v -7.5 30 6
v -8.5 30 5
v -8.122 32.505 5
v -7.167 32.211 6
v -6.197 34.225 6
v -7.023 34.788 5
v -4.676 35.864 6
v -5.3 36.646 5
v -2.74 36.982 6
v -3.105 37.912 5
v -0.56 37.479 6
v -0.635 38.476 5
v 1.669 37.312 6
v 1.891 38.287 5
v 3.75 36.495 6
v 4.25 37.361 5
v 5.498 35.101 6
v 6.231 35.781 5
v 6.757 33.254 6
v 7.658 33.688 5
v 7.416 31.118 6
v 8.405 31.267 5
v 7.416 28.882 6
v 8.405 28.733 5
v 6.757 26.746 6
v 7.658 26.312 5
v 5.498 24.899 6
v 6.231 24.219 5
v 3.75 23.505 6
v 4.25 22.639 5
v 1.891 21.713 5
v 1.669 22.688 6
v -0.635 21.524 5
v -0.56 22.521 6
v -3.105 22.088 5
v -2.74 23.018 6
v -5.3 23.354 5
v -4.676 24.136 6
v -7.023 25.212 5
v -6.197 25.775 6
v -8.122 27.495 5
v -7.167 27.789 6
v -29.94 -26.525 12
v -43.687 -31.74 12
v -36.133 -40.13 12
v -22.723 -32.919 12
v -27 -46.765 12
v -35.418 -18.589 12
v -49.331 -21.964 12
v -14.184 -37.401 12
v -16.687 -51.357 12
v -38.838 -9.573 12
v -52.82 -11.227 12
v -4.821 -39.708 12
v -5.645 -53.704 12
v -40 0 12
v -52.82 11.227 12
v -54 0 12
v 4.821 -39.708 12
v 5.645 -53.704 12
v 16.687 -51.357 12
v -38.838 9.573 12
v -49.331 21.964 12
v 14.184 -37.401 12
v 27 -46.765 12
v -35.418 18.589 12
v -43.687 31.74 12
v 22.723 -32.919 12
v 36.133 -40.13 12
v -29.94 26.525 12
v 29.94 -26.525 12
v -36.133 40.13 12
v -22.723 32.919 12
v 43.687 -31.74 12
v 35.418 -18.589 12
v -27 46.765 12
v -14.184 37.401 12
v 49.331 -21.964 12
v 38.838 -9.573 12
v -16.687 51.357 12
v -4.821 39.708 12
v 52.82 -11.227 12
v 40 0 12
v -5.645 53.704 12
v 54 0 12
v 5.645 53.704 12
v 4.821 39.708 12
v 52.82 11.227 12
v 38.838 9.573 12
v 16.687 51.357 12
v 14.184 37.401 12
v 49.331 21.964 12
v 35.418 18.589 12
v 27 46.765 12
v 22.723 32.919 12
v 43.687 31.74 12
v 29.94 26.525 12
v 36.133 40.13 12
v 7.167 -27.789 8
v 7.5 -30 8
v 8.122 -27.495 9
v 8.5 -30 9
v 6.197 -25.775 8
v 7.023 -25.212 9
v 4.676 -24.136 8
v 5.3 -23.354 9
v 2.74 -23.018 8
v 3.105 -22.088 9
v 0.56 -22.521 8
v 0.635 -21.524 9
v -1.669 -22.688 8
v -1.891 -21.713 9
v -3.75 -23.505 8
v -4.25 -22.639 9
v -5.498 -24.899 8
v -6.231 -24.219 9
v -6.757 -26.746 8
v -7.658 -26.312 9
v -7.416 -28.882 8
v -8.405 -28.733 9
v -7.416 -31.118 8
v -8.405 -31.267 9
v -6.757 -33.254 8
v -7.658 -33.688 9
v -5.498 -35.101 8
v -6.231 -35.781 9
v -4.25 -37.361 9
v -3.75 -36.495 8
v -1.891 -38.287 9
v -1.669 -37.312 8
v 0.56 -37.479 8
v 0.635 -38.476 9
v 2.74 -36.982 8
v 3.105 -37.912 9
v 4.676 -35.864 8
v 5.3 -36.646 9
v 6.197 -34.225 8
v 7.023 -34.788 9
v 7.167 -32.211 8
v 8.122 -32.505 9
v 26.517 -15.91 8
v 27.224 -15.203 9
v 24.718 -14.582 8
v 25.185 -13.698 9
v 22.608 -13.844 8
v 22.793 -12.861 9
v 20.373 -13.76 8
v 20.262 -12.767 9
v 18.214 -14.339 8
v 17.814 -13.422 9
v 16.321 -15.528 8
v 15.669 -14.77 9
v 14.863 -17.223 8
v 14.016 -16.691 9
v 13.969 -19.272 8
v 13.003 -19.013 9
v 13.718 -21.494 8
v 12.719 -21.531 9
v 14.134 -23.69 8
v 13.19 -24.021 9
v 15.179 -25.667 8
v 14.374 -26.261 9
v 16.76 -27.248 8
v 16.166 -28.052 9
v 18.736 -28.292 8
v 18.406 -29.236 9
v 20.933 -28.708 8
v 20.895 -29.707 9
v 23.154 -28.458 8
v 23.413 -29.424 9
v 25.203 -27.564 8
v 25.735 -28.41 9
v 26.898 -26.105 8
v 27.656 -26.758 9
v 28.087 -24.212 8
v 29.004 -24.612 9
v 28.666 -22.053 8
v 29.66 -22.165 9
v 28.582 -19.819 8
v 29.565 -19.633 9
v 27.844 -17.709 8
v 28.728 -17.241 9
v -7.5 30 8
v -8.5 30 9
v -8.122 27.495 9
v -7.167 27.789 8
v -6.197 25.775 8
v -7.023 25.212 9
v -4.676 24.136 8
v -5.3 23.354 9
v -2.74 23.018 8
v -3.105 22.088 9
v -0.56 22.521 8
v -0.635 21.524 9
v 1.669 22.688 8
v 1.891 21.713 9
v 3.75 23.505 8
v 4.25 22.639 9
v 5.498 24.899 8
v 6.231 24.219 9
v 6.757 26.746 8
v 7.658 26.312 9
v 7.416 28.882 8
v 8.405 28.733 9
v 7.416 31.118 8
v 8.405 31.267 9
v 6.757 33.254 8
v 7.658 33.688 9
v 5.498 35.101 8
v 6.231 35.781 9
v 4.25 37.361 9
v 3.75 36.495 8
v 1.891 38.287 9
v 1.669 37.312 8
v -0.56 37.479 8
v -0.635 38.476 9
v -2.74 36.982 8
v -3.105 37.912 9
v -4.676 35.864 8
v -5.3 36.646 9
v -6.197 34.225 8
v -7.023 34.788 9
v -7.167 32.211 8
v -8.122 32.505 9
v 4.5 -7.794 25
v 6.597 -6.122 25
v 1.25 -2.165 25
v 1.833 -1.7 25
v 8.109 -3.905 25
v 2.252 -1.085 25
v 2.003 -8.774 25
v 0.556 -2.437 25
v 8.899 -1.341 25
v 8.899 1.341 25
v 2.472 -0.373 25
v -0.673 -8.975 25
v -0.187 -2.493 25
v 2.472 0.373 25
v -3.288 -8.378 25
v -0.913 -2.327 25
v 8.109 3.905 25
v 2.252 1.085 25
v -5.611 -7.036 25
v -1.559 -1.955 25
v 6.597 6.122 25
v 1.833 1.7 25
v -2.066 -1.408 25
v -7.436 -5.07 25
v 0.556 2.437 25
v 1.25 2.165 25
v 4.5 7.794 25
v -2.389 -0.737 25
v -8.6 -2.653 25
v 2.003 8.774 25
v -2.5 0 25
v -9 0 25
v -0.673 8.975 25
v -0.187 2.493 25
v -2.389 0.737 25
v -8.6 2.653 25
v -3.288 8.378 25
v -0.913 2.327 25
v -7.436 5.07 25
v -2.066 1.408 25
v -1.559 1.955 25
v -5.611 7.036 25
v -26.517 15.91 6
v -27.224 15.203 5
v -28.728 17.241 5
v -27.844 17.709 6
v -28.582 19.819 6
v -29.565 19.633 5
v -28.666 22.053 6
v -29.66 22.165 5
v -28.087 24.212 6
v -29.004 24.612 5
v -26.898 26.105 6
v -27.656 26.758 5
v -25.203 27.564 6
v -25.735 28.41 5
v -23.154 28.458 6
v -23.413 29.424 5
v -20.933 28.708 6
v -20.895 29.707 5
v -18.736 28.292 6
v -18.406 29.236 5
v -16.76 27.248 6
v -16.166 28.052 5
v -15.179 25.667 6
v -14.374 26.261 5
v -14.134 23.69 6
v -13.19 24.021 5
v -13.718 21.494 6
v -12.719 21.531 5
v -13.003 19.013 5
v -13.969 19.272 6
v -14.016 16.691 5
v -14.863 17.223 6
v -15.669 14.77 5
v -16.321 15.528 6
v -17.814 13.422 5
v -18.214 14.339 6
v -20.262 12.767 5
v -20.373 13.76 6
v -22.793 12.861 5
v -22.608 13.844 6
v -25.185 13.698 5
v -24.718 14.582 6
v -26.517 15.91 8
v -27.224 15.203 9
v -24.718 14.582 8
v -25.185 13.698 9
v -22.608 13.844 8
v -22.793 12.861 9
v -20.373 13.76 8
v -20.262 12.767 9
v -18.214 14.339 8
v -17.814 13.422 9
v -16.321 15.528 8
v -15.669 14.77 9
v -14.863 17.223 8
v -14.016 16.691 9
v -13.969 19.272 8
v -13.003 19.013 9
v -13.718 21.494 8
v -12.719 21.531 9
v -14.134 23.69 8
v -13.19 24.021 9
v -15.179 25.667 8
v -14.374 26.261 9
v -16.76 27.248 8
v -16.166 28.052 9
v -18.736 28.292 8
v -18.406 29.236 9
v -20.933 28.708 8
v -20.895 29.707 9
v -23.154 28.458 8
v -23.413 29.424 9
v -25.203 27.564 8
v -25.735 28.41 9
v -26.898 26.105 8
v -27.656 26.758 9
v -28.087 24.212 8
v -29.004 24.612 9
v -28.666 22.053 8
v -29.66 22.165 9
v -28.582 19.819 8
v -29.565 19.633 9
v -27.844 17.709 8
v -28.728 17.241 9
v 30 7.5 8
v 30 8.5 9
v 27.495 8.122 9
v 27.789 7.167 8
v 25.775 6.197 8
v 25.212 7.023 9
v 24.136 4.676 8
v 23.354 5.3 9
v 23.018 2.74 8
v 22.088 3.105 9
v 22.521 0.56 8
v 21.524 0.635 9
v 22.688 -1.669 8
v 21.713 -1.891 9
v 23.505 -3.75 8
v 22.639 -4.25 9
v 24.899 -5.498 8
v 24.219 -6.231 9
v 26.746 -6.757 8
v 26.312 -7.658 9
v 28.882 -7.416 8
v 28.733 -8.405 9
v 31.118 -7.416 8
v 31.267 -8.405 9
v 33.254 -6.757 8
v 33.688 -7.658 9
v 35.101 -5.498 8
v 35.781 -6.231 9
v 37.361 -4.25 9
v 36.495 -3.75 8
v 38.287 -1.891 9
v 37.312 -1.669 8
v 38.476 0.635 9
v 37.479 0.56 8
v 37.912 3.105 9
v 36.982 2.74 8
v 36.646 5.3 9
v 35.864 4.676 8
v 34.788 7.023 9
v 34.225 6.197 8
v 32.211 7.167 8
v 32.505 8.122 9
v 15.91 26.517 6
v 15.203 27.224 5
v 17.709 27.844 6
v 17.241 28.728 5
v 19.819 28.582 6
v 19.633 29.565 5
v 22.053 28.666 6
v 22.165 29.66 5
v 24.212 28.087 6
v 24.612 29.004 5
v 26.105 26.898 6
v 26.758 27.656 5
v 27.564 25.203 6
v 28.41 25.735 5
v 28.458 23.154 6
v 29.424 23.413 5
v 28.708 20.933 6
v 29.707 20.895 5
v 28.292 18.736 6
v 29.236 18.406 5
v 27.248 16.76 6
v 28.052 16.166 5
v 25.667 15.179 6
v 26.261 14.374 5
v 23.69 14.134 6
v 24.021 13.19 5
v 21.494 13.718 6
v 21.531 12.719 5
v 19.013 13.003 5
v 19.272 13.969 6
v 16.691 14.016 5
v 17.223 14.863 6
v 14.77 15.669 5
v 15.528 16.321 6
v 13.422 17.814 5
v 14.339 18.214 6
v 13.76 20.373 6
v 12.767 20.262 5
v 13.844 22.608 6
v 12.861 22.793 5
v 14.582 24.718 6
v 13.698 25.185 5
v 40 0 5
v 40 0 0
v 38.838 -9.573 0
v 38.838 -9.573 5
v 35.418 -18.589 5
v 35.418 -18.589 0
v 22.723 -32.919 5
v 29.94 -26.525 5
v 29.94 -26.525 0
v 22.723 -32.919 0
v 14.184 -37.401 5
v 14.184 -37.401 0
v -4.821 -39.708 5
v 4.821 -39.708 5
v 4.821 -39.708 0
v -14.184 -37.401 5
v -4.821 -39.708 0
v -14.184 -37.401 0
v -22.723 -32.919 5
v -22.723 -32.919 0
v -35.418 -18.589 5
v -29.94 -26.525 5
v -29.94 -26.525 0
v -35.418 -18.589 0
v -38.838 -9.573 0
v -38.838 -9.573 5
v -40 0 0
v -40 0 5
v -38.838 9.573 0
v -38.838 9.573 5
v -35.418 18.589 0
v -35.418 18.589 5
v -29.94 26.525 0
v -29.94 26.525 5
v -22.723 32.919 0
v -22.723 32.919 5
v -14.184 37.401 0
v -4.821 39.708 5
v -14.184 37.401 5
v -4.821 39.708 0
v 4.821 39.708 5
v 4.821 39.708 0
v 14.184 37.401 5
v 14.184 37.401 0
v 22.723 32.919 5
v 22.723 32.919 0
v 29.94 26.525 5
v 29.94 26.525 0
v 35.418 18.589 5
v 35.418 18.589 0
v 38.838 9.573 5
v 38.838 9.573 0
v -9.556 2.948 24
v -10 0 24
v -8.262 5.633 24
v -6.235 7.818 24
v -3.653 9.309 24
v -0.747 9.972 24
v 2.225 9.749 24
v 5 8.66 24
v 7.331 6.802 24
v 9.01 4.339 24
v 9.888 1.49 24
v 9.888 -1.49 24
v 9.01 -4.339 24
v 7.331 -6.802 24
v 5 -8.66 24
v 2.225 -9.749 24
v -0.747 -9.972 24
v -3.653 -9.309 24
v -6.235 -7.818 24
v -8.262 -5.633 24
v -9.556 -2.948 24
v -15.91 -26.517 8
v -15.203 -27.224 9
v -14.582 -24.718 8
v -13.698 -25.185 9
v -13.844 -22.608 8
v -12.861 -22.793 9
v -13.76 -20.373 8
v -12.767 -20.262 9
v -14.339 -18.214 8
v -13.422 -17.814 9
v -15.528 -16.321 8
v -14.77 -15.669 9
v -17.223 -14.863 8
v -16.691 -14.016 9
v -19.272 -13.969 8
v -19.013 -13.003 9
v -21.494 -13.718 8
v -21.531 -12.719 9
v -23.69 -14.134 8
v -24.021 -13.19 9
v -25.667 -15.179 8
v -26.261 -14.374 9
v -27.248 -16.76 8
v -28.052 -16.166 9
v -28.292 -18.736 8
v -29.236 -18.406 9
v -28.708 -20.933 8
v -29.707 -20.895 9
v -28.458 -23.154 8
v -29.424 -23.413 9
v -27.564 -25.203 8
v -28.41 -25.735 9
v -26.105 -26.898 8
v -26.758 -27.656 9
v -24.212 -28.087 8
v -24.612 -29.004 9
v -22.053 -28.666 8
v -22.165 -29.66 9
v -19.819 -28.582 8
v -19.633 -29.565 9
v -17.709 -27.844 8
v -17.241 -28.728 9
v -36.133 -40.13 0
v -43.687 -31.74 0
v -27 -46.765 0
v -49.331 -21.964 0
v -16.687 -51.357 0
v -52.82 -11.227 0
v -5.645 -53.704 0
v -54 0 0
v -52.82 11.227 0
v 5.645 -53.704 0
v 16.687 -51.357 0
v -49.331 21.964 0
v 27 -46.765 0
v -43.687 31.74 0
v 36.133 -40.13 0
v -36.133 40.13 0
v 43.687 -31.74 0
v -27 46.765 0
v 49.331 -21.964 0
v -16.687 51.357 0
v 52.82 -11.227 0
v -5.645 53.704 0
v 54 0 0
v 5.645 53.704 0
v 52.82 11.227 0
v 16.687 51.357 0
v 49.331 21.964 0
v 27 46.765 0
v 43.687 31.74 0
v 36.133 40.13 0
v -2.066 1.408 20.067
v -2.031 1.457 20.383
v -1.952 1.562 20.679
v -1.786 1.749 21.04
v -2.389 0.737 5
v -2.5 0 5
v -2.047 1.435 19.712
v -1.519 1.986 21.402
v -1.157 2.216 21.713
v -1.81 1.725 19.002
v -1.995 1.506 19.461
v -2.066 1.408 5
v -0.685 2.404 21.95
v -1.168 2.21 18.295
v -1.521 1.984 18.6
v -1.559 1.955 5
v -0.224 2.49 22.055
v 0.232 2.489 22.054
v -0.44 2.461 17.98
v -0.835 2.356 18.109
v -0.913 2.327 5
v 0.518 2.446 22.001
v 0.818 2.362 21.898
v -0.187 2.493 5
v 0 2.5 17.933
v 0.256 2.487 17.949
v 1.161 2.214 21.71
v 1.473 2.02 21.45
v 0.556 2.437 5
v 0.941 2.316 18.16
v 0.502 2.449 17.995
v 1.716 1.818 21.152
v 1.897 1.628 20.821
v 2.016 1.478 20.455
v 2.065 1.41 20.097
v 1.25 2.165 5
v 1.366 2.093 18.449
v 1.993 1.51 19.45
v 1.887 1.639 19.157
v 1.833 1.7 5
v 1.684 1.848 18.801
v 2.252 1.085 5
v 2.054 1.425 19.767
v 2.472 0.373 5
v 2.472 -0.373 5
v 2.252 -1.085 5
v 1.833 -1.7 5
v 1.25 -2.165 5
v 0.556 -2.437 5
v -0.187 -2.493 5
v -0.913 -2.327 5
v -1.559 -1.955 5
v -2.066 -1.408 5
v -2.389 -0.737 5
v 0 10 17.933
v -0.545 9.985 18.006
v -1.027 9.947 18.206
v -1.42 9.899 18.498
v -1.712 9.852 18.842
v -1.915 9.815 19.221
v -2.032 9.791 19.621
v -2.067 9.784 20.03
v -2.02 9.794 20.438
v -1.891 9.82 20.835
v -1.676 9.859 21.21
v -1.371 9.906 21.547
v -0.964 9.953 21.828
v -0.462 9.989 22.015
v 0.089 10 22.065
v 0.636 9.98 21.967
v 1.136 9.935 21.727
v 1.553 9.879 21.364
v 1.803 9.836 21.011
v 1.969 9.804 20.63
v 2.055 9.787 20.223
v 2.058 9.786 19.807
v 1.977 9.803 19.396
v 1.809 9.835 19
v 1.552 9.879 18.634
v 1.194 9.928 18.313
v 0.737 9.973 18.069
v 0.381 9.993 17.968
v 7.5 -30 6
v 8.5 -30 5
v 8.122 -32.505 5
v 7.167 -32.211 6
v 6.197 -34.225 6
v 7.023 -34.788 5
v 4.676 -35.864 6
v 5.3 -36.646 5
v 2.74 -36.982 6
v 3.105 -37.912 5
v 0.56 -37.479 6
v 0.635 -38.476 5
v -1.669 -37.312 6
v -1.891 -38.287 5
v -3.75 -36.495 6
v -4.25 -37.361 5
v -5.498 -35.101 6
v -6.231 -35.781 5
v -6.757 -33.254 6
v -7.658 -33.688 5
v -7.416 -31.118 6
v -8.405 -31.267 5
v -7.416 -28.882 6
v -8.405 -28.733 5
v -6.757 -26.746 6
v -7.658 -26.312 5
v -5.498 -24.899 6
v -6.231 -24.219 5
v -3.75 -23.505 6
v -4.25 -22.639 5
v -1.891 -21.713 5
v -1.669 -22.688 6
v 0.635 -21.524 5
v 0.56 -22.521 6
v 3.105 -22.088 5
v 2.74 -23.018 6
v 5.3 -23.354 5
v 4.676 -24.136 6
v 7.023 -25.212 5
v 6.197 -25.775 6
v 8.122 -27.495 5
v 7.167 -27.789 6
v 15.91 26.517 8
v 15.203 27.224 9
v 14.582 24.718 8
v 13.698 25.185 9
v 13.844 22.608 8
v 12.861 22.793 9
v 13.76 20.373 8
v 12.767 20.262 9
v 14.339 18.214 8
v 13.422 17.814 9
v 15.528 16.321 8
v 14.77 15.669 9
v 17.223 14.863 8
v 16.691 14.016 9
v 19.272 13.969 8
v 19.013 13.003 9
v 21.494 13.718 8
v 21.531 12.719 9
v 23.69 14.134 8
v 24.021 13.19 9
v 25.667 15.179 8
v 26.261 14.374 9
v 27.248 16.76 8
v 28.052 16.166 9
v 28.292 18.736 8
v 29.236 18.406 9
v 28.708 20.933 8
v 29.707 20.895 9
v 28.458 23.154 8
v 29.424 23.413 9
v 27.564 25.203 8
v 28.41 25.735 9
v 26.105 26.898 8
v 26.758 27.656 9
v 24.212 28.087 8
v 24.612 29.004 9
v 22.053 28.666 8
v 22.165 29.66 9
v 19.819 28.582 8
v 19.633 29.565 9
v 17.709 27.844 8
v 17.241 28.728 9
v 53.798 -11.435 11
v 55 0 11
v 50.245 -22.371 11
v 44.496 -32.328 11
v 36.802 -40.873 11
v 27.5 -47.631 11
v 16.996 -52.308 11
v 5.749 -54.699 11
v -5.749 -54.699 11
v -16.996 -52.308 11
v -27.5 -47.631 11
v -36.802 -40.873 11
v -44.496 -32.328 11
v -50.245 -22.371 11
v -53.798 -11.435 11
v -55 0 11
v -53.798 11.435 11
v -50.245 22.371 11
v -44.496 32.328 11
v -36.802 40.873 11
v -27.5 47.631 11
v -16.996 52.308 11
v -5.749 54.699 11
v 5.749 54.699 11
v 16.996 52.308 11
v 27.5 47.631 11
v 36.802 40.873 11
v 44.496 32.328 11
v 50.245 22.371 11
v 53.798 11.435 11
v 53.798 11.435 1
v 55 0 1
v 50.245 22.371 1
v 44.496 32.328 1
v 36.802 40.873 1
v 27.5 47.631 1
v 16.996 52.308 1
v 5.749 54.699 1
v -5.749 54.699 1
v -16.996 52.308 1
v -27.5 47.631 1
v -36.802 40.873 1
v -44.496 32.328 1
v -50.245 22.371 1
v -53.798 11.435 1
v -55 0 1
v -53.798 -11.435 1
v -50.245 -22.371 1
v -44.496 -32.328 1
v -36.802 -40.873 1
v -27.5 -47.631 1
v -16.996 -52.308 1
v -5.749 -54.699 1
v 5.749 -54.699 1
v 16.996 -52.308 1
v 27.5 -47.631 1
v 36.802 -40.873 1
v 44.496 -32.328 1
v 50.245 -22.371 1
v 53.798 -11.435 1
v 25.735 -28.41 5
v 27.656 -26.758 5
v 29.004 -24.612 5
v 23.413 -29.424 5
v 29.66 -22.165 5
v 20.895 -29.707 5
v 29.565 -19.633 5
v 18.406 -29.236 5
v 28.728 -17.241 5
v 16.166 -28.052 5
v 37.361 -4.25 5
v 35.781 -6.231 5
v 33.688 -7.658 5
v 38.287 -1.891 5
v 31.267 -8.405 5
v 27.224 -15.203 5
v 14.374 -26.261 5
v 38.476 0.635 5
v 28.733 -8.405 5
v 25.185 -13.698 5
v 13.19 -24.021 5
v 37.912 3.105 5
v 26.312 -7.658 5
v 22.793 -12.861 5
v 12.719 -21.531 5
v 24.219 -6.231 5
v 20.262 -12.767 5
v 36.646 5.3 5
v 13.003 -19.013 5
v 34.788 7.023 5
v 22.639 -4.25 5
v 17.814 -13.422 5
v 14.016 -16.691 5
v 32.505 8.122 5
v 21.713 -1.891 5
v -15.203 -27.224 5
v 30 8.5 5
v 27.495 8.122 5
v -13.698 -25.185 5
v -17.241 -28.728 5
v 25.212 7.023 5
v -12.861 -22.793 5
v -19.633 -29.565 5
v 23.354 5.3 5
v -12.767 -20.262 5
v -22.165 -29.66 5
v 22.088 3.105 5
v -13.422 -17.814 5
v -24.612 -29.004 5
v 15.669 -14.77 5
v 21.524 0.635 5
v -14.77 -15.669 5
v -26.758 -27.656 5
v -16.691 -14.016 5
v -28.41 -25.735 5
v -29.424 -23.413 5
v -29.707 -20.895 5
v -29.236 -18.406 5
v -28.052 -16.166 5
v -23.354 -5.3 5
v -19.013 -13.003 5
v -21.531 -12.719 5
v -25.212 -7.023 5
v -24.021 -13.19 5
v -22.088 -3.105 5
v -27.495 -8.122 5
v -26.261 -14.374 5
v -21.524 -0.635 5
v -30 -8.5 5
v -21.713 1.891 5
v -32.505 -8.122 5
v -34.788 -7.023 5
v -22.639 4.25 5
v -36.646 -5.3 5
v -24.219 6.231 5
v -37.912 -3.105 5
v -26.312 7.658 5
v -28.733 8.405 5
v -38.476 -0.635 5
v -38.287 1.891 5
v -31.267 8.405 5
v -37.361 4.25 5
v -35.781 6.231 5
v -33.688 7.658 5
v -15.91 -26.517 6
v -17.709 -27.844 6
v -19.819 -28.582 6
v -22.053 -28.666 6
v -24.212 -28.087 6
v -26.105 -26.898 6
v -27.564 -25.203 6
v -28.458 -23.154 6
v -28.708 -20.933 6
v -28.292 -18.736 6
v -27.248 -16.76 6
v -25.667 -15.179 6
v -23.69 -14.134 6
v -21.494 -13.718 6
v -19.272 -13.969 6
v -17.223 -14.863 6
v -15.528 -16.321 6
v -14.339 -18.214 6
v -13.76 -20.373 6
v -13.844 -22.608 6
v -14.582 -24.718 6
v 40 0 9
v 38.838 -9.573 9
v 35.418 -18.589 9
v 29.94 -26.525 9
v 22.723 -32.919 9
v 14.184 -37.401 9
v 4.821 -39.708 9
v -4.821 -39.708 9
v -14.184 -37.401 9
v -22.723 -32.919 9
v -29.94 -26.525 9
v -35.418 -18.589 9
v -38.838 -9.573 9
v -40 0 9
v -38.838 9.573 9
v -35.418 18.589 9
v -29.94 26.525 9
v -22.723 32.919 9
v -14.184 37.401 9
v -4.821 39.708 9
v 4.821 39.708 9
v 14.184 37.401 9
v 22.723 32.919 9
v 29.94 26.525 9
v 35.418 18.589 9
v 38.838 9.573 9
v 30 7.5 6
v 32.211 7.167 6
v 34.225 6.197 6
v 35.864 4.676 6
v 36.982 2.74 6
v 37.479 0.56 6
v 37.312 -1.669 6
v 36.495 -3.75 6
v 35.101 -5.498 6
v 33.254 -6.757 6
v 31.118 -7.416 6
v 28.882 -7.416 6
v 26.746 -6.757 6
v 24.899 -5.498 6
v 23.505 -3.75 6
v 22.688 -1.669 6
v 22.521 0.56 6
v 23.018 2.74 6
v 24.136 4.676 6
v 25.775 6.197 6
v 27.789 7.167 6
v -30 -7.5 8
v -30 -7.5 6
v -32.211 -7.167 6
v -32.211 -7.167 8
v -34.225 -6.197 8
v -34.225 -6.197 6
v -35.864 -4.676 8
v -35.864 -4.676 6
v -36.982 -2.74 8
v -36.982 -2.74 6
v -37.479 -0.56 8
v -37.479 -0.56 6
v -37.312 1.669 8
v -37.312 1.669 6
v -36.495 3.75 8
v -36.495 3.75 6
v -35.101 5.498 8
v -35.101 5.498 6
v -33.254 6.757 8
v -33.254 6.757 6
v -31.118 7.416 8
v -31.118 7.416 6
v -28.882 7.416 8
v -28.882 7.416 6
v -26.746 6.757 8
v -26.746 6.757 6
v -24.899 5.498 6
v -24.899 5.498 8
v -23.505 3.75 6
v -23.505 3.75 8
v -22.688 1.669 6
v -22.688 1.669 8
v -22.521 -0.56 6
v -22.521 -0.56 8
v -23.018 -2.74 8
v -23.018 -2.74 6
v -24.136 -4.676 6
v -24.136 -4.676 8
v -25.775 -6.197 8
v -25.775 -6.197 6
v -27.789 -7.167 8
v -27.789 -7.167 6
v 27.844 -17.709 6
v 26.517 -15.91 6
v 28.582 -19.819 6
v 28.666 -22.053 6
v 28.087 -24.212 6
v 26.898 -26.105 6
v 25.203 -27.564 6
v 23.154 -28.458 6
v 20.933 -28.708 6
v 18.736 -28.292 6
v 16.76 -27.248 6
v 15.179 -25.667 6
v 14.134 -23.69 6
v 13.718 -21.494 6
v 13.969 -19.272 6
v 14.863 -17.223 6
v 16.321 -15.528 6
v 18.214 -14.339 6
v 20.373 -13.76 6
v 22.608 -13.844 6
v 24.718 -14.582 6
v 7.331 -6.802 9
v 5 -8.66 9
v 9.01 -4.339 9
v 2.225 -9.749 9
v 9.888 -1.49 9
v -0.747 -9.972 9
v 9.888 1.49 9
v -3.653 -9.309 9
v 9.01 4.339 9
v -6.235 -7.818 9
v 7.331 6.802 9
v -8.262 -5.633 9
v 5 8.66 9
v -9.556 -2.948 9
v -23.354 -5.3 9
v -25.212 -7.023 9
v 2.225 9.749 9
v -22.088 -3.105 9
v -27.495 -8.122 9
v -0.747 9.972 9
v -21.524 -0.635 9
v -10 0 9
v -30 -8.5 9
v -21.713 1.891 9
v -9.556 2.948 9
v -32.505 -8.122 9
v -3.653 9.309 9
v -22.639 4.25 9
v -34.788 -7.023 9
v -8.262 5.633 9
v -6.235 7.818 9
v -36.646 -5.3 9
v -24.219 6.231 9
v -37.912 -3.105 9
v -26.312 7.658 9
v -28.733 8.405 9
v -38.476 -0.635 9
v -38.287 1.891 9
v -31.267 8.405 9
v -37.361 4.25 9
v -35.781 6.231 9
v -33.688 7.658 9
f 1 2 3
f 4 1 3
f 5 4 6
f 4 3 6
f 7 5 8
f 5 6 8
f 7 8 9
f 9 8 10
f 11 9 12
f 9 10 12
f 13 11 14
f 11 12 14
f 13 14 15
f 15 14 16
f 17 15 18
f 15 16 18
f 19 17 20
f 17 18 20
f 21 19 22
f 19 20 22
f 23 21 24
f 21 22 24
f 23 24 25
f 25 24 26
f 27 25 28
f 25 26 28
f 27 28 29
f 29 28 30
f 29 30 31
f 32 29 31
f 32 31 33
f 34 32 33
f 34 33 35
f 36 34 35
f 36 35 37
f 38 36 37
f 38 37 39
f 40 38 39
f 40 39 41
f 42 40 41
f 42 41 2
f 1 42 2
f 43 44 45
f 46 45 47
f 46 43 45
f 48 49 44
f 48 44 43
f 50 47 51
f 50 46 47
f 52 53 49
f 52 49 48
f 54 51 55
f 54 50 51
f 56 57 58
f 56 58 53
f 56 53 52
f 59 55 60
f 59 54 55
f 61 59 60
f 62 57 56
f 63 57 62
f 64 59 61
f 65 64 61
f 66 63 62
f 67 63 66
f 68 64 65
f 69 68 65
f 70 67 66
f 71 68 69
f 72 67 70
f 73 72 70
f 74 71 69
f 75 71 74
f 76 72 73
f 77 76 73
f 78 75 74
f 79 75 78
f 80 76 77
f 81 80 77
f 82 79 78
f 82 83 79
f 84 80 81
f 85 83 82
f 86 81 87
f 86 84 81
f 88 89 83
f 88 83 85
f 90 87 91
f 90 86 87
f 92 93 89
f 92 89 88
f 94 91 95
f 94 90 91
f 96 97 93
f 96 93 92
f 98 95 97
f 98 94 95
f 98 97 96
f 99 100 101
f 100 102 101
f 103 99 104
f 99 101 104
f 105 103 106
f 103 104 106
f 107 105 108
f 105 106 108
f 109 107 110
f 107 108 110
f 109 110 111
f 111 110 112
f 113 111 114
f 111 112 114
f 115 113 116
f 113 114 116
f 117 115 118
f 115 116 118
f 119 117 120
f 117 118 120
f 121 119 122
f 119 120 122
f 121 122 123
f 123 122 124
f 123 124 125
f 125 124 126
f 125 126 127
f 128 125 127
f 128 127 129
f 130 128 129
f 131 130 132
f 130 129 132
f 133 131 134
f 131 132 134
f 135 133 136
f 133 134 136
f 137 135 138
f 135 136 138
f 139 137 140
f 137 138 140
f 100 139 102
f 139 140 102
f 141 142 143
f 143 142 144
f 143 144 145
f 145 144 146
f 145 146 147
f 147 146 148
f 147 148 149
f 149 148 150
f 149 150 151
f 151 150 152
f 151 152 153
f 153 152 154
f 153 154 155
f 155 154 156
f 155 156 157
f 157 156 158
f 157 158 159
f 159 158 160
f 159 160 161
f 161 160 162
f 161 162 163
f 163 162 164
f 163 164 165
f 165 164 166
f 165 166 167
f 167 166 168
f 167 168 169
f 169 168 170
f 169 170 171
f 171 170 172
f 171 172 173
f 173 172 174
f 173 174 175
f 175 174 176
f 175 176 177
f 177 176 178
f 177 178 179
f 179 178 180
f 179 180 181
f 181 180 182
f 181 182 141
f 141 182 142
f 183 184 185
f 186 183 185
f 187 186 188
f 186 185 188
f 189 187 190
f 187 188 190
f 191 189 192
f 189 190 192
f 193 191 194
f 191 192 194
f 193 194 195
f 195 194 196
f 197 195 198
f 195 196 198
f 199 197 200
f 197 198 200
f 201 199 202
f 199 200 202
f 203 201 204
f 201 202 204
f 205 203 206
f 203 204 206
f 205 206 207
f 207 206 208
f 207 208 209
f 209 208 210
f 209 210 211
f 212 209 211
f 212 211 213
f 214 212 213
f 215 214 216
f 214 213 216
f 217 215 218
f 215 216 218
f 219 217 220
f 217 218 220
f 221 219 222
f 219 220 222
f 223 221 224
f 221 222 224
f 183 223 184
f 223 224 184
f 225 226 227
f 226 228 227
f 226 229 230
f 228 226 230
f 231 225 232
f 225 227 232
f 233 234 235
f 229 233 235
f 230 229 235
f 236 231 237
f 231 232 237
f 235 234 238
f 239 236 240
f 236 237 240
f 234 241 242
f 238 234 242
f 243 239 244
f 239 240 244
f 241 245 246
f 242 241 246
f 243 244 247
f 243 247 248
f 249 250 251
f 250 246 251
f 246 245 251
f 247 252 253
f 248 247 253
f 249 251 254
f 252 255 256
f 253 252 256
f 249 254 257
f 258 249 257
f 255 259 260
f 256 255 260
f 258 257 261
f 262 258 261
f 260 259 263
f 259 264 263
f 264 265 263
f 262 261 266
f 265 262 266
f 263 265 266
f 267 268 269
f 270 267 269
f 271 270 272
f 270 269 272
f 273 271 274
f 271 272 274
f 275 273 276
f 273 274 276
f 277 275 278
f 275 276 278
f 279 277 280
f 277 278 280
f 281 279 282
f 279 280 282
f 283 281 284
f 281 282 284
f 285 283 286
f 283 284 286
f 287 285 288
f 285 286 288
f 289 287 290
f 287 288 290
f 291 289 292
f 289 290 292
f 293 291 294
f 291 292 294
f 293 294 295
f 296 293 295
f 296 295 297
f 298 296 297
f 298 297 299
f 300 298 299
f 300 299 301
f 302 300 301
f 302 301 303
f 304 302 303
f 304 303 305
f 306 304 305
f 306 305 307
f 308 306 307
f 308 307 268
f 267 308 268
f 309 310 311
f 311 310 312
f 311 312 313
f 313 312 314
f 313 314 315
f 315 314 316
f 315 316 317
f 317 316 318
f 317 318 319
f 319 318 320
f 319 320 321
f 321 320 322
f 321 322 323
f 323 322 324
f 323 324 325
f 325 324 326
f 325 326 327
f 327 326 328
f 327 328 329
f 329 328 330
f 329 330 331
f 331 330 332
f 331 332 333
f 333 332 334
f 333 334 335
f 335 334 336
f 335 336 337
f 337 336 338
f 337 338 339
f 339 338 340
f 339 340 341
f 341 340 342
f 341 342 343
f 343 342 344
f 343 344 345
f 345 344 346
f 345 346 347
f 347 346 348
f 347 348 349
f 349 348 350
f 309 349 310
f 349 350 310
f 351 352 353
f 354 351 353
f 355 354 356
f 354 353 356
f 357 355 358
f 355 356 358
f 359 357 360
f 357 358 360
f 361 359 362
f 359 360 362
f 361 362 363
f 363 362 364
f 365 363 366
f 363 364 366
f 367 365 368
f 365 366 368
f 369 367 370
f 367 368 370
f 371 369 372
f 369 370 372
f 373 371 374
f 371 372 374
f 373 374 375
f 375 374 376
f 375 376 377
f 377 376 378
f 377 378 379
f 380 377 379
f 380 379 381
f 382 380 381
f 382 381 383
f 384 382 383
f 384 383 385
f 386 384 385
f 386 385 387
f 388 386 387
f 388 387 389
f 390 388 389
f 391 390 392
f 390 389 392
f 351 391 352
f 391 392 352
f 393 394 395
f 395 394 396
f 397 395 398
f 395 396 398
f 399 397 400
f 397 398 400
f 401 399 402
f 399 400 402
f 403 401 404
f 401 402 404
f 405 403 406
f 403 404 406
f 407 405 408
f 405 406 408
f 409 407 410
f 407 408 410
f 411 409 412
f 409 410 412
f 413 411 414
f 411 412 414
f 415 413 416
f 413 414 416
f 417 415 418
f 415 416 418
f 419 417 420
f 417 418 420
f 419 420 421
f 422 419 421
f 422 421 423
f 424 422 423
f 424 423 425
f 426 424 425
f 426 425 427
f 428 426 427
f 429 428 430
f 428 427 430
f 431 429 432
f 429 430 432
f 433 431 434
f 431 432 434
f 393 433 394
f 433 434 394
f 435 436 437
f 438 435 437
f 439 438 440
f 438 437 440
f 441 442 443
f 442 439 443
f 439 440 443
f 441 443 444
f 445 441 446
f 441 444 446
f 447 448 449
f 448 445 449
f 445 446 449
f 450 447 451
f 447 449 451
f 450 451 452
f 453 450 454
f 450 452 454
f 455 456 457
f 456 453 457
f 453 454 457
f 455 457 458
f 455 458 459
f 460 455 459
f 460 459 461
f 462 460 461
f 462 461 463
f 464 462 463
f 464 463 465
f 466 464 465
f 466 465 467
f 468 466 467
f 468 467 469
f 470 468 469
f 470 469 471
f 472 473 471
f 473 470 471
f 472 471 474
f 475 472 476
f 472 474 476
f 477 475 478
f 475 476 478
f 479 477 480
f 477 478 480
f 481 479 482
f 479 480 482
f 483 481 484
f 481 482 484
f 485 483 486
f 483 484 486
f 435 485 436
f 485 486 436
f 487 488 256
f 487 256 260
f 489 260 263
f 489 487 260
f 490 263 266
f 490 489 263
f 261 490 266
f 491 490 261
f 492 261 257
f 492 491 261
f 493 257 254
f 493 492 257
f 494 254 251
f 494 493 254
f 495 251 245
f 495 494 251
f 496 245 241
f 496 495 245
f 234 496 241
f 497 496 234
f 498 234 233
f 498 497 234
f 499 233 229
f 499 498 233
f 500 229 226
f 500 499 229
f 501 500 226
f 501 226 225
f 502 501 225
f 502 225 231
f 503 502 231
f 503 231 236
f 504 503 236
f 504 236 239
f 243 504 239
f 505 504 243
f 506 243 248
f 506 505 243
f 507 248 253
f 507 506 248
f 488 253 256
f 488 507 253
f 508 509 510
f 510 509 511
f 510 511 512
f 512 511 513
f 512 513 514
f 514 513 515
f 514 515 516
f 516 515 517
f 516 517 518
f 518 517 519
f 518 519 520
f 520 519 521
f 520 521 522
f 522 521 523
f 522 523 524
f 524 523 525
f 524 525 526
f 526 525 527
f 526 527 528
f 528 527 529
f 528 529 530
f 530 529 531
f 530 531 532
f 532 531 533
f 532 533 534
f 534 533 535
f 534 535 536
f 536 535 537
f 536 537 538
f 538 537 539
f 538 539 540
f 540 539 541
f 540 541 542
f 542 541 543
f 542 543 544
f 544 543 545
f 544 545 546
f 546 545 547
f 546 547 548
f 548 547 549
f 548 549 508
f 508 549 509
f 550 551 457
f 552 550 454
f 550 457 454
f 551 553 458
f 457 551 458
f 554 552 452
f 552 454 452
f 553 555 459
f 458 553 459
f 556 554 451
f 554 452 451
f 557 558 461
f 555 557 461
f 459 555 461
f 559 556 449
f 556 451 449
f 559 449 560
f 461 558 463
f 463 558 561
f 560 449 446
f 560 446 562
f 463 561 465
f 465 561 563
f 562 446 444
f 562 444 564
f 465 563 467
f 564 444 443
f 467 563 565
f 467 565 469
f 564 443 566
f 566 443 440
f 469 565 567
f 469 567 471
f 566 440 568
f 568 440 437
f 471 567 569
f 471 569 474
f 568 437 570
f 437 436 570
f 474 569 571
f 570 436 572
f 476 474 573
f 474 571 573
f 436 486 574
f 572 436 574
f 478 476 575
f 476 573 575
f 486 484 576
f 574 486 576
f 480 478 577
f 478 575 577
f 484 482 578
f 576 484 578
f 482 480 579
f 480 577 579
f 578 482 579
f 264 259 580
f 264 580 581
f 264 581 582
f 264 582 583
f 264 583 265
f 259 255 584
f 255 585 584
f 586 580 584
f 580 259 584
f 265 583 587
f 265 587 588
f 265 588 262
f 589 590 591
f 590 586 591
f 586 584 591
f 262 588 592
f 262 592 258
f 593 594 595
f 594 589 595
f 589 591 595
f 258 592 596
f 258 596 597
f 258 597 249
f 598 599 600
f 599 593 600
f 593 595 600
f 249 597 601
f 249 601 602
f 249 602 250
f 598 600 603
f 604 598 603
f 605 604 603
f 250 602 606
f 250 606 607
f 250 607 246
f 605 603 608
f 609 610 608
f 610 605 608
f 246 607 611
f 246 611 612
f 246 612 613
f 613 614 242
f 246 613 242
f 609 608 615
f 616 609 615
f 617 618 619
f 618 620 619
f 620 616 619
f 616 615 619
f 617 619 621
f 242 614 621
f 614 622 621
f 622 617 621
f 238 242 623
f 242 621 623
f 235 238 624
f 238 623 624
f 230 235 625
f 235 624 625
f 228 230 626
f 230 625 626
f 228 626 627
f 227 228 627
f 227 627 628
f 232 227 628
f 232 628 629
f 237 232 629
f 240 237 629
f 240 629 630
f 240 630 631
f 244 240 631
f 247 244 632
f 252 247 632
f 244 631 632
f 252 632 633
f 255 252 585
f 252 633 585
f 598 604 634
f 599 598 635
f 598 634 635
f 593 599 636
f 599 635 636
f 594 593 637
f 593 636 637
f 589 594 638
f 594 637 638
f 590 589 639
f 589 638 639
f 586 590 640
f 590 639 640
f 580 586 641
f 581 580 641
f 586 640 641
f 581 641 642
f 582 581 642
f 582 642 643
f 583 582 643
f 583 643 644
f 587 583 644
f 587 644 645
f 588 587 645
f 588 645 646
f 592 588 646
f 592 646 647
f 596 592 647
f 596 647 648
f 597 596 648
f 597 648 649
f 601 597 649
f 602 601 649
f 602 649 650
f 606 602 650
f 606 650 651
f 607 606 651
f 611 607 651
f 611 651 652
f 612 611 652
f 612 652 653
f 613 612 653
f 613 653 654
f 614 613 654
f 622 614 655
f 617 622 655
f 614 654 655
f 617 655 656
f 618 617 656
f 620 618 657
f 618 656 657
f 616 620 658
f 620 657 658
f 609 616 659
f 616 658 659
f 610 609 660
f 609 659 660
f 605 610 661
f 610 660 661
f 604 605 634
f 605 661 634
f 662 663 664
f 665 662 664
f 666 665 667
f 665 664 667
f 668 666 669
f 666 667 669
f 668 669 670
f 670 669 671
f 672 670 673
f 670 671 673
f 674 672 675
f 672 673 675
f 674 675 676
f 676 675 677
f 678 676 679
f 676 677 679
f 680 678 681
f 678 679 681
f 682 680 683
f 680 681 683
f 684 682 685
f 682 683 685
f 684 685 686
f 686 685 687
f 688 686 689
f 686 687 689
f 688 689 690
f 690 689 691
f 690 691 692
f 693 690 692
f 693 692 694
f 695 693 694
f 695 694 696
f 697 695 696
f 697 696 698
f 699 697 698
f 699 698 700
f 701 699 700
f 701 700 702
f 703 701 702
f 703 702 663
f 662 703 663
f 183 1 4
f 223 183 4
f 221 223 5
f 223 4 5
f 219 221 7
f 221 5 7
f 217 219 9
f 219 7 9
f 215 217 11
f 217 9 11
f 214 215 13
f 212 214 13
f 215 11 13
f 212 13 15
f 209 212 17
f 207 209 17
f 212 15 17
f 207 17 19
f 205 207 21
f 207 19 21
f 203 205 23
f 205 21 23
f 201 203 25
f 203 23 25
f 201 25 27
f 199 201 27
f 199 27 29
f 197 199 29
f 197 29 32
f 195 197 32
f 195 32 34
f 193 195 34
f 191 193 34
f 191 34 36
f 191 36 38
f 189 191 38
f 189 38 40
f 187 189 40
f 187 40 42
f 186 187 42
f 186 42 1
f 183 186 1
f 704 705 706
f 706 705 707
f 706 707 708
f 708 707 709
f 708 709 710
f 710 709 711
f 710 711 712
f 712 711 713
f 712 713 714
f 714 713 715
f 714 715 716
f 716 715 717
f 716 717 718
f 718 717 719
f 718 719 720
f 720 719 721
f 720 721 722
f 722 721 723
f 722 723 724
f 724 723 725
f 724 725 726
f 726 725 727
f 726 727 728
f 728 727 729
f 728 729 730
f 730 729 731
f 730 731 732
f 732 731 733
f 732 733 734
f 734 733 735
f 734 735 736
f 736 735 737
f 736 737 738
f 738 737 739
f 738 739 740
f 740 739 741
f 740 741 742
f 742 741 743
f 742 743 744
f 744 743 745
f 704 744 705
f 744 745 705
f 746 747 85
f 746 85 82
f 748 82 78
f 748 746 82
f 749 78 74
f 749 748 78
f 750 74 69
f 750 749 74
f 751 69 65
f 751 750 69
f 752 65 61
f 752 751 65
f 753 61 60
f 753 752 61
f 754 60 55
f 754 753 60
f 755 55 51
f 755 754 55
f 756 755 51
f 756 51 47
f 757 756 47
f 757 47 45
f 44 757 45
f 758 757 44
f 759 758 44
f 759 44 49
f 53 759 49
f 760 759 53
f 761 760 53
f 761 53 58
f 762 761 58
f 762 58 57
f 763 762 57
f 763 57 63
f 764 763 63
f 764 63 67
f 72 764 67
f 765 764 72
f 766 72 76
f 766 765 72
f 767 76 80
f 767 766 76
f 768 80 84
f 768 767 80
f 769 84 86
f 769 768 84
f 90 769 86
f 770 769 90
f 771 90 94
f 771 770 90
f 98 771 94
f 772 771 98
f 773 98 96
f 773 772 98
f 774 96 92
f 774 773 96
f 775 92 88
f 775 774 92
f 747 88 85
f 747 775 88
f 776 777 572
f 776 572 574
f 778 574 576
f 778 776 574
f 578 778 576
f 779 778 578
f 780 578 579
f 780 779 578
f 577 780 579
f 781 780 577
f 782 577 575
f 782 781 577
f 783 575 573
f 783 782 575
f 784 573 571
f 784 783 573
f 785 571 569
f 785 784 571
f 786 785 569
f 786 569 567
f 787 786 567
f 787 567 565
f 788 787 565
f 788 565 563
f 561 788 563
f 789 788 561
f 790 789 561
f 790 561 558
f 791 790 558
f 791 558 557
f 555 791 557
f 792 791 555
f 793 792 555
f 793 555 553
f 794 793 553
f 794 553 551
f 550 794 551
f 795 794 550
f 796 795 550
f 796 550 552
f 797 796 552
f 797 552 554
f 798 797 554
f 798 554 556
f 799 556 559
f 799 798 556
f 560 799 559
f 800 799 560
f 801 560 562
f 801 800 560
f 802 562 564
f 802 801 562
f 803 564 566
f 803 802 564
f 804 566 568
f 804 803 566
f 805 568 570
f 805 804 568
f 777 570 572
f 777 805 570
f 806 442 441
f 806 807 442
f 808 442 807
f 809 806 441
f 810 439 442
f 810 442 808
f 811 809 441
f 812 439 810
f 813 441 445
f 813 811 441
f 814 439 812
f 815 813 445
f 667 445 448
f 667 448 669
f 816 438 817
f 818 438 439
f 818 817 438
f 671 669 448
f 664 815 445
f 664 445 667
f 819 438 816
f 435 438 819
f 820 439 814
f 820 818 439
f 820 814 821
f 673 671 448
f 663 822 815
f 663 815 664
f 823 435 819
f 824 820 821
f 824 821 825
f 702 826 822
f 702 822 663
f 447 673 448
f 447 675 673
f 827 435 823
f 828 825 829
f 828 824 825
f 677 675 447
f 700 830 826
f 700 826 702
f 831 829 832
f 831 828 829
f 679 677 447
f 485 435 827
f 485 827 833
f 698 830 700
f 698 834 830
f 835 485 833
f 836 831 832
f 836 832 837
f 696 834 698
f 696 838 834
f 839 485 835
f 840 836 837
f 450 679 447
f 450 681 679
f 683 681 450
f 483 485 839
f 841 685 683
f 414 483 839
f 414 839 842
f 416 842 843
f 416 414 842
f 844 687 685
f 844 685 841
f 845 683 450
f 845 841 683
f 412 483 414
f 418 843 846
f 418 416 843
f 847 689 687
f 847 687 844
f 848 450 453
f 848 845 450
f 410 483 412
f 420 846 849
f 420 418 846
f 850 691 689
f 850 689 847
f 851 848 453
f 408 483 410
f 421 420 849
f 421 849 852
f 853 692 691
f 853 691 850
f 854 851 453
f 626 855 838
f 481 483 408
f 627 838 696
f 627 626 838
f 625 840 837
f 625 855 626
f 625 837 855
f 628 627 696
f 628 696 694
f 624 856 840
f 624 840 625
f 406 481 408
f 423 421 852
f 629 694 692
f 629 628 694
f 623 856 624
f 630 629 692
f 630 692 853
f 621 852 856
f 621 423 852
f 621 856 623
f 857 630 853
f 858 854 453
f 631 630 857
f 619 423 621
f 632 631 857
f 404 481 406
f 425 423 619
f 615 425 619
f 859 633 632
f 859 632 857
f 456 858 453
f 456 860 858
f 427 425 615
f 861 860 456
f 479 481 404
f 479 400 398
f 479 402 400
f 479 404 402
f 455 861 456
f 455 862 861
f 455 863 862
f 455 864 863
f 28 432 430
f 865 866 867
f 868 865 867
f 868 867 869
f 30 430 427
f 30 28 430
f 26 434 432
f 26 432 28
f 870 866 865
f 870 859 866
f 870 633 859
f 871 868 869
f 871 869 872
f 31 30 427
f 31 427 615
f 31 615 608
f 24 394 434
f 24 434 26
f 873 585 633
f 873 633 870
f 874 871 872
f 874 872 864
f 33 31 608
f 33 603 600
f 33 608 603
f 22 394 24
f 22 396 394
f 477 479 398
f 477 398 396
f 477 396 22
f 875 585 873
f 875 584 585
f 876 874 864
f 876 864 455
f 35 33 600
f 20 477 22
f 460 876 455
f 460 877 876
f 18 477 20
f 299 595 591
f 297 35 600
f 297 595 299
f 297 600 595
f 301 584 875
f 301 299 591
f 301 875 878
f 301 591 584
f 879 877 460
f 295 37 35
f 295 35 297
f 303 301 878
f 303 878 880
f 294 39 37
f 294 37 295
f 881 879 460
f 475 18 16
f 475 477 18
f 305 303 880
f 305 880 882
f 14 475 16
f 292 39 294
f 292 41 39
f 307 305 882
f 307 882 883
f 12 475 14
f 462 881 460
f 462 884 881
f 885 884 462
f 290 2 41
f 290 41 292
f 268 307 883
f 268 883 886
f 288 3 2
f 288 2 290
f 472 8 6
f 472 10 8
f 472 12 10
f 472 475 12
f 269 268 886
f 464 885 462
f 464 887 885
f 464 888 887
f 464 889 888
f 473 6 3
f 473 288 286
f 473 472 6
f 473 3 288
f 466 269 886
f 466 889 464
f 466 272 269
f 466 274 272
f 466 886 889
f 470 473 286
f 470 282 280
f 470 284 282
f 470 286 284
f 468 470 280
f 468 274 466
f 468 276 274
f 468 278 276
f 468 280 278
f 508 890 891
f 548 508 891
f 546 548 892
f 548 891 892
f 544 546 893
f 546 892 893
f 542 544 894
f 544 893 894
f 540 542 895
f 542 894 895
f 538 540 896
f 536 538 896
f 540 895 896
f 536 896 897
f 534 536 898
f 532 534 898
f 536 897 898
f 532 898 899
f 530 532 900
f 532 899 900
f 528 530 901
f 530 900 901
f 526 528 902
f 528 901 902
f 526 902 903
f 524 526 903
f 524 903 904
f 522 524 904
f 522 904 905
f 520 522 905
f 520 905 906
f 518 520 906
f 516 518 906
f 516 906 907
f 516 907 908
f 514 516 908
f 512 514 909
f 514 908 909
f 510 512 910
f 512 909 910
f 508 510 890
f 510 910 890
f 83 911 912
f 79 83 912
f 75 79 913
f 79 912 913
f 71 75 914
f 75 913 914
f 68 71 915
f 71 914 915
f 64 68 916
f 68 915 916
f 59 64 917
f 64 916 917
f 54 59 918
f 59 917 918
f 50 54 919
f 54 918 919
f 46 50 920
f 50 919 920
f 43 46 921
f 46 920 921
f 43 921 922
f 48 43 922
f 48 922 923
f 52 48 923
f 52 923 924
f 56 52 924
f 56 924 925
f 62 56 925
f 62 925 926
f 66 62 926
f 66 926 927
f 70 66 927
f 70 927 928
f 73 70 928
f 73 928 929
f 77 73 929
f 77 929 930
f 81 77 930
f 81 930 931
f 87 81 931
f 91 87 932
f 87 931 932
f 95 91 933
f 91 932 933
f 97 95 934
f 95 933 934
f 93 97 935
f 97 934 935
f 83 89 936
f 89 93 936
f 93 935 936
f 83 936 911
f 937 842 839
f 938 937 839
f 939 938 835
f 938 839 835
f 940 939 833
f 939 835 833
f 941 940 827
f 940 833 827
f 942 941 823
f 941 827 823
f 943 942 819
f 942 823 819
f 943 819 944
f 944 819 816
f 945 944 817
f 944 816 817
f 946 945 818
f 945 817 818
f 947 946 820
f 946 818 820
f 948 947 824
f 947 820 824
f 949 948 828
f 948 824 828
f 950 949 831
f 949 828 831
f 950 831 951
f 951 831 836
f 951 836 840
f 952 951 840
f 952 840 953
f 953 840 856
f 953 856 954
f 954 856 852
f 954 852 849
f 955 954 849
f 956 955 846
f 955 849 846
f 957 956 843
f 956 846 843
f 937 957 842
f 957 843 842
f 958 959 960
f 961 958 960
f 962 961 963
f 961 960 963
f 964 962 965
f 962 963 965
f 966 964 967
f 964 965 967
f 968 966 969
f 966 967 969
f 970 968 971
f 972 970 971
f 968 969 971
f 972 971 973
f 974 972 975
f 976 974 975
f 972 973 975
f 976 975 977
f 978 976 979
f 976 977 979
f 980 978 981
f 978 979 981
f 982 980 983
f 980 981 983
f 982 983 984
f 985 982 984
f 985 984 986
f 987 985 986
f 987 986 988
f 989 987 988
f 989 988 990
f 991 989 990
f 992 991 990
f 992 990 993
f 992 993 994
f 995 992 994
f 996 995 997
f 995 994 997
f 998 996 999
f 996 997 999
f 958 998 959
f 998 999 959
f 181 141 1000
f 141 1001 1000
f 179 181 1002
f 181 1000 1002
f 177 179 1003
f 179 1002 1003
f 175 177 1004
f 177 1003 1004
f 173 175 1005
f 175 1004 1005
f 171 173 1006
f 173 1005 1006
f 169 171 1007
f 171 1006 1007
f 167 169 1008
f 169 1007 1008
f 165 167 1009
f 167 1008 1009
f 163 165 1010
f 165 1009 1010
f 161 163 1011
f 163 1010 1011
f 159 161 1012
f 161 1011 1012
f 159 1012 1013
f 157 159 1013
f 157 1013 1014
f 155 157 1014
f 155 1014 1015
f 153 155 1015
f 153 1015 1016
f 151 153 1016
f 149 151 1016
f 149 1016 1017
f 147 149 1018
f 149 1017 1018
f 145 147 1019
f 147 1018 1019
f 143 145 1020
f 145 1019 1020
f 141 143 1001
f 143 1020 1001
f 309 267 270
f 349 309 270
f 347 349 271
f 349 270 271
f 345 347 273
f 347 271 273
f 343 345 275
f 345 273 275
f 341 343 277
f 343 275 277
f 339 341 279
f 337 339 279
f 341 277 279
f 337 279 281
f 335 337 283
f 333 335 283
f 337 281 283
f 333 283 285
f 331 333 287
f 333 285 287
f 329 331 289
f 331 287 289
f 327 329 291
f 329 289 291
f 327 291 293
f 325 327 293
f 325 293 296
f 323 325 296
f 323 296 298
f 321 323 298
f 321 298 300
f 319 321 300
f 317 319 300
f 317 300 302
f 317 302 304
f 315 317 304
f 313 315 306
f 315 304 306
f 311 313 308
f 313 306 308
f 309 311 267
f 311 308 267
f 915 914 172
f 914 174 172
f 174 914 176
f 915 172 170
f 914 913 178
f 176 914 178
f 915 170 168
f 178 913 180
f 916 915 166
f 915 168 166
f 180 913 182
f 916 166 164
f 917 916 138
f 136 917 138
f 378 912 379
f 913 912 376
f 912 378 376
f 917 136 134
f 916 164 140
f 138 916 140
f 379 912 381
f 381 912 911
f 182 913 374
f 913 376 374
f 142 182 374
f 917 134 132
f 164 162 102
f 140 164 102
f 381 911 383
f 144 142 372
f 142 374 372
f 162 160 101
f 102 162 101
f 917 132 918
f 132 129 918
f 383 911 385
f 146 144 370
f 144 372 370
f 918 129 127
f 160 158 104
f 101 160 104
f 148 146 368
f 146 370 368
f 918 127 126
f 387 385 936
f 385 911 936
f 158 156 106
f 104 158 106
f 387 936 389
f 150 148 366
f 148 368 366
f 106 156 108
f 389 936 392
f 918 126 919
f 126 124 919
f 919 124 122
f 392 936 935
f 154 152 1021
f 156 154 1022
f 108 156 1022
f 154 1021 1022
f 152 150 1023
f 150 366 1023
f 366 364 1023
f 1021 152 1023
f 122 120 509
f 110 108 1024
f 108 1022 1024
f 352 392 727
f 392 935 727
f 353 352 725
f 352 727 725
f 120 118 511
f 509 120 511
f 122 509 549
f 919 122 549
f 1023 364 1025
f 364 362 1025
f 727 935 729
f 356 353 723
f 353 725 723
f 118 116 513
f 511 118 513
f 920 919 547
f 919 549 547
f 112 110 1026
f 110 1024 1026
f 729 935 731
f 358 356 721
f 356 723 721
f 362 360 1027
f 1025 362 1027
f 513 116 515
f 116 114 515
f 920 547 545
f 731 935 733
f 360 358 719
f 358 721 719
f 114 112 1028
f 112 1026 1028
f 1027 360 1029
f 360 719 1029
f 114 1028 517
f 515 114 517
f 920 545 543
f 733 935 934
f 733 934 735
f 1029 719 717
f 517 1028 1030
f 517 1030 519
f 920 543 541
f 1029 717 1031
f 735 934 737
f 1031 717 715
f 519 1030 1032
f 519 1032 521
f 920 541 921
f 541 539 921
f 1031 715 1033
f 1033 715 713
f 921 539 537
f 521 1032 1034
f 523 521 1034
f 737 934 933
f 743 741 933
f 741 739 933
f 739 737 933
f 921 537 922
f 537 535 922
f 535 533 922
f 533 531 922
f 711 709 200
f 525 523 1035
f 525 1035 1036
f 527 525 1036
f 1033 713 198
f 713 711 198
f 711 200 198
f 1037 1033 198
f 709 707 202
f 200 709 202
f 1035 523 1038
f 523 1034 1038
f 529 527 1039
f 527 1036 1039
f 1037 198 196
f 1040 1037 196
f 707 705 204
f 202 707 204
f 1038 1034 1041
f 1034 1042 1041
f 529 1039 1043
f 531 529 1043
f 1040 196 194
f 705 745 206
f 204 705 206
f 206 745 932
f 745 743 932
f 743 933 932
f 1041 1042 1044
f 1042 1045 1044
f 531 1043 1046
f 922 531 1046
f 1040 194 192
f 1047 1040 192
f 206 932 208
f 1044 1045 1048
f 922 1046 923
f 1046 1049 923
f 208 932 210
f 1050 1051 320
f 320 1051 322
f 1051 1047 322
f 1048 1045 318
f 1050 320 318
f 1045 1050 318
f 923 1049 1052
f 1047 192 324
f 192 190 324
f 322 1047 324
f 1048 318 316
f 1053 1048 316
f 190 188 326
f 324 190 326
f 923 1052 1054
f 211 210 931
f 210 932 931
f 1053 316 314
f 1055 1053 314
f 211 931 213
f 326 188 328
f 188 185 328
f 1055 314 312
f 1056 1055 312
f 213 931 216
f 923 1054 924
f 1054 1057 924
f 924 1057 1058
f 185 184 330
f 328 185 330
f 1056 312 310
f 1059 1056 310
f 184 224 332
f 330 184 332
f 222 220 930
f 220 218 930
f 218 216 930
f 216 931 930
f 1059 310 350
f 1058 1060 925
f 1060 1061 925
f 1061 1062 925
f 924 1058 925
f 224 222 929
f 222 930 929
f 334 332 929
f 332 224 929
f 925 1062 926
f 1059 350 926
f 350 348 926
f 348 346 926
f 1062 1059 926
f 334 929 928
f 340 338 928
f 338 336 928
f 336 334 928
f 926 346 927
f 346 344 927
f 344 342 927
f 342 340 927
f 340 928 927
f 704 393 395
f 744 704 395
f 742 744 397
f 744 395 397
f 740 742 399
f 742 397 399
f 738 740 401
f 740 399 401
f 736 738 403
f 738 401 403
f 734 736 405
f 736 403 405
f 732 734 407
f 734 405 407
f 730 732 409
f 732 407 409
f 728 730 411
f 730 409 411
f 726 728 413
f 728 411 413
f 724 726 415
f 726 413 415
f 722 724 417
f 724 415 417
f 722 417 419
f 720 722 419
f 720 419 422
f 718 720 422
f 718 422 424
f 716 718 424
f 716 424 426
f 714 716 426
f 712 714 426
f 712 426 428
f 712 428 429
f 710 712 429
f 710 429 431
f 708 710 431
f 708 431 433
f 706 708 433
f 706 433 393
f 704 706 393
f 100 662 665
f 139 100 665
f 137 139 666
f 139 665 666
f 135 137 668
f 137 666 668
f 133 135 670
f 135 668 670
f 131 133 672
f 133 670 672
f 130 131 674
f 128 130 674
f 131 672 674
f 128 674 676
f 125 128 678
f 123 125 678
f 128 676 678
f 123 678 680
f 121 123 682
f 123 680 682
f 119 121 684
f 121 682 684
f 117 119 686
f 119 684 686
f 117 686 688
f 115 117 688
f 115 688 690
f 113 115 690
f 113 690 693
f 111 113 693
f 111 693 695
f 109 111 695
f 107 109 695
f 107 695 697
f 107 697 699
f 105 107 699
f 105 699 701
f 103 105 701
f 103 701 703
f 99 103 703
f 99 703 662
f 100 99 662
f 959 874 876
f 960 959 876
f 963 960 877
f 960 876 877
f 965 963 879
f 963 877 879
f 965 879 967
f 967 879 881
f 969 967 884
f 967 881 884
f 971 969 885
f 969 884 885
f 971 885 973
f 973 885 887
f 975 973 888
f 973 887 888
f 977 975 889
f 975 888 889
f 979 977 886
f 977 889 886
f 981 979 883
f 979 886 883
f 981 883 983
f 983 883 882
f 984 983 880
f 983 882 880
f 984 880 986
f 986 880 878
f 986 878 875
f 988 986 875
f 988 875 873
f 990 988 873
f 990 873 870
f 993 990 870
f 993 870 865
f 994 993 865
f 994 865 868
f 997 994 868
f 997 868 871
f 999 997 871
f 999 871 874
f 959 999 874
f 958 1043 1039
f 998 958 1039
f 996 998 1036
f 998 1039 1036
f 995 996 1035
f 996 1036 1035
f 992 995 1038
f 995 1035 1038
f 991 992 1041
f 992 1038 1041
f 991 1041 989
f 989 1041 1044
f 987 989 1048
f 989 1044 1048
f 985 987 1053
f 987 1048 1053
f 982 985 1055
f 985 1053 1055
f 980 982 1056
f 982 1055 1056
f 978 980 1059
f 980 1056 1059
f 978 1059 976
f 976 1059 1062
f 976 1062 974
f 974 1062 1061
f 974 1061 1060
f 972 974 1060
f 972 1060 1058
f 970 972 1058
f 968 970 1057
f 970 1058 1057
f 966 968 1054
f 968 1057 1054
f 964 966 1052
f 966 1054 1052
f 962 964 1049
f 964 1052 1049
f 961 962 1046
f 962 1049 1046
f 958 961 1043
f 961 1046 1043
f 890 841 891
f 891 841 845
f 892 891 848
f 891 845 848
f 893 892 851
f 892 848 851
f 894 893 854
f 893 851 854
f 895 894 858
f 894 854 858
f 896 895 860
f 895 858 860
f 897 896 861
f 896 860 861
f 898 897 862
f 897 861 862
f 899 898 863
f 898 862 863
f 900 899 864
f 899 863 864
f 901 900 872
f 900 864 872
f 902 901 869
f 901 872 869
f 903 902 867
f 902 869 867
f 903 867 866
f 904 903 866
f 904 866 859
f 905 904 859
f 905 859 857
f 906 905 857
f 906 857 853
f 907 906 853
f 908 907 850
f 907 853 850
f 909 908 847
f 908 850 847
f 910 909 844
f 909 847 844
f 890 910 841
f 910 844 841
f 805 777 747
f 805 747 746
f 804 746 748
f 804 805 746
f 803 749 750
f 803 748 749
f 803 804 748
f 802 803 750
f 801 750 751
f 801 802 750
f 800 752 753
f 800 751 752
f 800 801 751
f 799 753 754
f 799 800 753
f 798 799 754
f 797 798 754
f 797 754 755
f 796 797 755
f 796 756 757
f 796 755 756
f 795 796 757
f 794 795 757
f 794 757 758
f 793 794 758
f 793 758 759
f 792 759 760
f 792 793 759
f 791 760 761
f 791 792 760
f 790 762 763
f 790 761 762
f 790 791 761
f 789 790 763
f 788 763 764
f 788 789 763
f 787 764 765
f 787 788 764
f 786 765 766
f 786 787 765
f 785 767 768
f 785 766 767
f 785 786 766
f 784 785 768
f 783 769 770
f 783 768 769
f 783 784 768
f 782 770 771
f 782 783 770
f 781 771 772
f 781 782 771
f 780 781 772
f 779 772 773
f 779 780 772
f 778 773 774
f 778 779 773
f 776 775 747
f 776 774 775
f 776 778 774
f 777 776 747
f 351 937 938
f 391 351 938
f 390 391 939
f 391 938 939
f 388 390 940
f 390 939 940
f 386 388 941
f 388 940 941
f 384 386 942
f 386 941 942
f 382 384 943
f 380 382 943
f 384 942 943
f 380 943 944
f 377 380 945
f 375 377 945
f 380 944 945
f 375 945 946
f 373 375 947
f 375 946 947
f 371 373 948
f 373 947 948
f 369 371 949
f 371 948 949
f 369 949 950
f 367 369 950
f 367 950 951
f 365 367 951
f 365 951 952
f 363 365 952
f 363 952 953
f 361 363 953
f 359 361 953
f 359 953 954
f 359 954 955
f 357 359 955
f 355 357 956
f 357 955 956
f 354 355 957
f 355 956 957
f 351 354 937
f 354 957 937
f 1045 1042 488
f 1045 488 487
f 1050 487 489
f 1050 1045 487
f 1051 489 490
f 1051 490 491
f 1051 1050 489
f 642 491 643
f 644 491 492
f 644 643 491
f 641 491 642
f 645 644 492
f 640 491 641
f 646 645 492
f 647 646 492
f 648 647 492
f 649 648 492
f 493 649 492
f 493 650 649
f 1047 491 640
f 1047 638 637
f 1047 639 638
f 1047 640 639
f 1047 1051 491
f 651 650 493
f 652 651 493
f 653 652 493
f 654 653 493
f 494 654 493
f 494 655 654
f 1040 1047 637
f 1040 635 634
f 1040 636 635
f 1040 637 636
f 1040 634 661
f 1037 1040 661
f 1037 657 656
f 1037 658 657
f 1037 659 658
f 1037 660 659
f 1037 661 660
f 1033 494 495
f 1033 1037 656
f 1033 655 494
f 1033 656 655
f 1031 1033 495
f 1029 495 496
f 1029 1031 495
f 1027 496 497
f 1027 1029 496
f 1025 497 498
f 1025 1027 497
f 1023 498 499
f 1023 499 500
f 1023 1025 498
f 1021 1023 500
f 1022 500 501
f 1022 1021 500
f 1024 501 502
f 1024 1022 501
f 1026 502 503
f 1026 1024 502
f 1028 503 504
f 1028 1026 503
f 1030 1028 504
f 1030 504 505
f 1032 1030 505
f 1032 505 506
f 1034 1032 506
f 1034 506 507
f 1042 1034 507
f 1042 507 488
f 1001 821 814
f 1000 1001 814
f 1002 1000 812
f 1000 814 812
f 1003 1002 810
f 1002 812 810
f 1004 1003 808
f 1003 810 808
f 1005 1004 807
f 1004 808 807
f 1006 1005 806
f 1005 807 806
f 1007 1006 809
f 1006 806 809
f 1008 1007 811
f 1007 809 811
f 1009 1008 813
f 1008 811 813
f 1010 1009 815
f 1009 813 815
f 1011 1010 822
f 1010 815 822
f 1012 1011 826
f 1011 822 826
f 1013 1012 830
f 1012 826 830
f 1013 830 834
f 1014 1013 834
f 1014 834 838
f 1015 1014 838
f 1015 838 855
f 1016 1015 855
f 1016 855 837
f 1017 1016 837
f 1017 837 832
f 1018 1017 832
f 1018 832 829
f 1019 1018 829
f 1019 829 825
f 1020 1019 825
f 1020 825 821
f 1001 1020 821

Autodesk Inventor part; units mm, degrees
ref_plane "YZ Plane" through (0, 0, 0) normal (1, 0, 0) x (0, 1, 0)
ref_plane "XZ Plane" through (0, 0, 0) normal (0, 1, 0) x (-1, 0, 0)
sketch "Sketch1" plane through (0, 0, 0) normal (0, 0, 1) x (1, 0, 0)
  circle A0 centre (0, 0) radius 55
  circle A1 centre (0, 0) radius 40
  dimension "d0" = 110
  dimension "d1" = 80
extrude "Extrusion1" add sketch "Sketch1" along normal blind 12
ref_plane "Work Plane1" through (0, 0, 5) normal (0, 0, -1) x (-1, 0, 0)
sketch "Sketch2" plane through (0, 0, 5) normal (0, 0, -1) x (-1, 0, 0)
  circle A0 centre (0, 0) radius 40 projected
  circle A1 centre (0, 30) radius 7.5
  circle A2 centre (0, 0) radius 10
  circle A3 centre (0, 0) radius 2.5
  dimension "d5" = 15
  dimension "d6" = 30
  dimension "d11" = 20
  dimension "d12" = 5
extrude "Extrusion2" add sketch "Sketch2" against normal blind 4 contours A0 | A1
extrude "Extrusion4" cut sketch "Sketch2" against normal blind 4 contours A1
extrude "Extrusion3" add sketch "Sketch2" against normal blind 20 contours A2
sketch "Sketch3" plane through (0, 0, 0) normal (0, 1, 0) x (-1, 0, 0)
  line L0 (10, 25) -> (-10, 25) projected
  line L1 (-10, 9) -> (10, 9) projected
  point P0 (0, 0)
  point P1 (0, 20)
  point P2 (0, 25)
  dimension "d17" = 5
hole "Hole1" at (0, 0, 20) direction (0, 1, 0) diameter 4.134 end through all thread size "M5x0.8" class "6H" standard "ISO Metric profile"
chamfer "Chamfer1" distance 1 angle 45 3 edges at (-55, 0, 12) (-55, 0, 0) (10, 0, 25)
chamfer "Chamfer2" distance 1 angle 45 2 edges at (7.5, 30, 5) (7.5, 30, 9)
pattern_circular "Circular Pattern1" count 8 over 360 about axis through (0, 0, 5) along (0, 0, 1) of "Extrusion4", "Chamfer2"
properties part number "Flywheel"
